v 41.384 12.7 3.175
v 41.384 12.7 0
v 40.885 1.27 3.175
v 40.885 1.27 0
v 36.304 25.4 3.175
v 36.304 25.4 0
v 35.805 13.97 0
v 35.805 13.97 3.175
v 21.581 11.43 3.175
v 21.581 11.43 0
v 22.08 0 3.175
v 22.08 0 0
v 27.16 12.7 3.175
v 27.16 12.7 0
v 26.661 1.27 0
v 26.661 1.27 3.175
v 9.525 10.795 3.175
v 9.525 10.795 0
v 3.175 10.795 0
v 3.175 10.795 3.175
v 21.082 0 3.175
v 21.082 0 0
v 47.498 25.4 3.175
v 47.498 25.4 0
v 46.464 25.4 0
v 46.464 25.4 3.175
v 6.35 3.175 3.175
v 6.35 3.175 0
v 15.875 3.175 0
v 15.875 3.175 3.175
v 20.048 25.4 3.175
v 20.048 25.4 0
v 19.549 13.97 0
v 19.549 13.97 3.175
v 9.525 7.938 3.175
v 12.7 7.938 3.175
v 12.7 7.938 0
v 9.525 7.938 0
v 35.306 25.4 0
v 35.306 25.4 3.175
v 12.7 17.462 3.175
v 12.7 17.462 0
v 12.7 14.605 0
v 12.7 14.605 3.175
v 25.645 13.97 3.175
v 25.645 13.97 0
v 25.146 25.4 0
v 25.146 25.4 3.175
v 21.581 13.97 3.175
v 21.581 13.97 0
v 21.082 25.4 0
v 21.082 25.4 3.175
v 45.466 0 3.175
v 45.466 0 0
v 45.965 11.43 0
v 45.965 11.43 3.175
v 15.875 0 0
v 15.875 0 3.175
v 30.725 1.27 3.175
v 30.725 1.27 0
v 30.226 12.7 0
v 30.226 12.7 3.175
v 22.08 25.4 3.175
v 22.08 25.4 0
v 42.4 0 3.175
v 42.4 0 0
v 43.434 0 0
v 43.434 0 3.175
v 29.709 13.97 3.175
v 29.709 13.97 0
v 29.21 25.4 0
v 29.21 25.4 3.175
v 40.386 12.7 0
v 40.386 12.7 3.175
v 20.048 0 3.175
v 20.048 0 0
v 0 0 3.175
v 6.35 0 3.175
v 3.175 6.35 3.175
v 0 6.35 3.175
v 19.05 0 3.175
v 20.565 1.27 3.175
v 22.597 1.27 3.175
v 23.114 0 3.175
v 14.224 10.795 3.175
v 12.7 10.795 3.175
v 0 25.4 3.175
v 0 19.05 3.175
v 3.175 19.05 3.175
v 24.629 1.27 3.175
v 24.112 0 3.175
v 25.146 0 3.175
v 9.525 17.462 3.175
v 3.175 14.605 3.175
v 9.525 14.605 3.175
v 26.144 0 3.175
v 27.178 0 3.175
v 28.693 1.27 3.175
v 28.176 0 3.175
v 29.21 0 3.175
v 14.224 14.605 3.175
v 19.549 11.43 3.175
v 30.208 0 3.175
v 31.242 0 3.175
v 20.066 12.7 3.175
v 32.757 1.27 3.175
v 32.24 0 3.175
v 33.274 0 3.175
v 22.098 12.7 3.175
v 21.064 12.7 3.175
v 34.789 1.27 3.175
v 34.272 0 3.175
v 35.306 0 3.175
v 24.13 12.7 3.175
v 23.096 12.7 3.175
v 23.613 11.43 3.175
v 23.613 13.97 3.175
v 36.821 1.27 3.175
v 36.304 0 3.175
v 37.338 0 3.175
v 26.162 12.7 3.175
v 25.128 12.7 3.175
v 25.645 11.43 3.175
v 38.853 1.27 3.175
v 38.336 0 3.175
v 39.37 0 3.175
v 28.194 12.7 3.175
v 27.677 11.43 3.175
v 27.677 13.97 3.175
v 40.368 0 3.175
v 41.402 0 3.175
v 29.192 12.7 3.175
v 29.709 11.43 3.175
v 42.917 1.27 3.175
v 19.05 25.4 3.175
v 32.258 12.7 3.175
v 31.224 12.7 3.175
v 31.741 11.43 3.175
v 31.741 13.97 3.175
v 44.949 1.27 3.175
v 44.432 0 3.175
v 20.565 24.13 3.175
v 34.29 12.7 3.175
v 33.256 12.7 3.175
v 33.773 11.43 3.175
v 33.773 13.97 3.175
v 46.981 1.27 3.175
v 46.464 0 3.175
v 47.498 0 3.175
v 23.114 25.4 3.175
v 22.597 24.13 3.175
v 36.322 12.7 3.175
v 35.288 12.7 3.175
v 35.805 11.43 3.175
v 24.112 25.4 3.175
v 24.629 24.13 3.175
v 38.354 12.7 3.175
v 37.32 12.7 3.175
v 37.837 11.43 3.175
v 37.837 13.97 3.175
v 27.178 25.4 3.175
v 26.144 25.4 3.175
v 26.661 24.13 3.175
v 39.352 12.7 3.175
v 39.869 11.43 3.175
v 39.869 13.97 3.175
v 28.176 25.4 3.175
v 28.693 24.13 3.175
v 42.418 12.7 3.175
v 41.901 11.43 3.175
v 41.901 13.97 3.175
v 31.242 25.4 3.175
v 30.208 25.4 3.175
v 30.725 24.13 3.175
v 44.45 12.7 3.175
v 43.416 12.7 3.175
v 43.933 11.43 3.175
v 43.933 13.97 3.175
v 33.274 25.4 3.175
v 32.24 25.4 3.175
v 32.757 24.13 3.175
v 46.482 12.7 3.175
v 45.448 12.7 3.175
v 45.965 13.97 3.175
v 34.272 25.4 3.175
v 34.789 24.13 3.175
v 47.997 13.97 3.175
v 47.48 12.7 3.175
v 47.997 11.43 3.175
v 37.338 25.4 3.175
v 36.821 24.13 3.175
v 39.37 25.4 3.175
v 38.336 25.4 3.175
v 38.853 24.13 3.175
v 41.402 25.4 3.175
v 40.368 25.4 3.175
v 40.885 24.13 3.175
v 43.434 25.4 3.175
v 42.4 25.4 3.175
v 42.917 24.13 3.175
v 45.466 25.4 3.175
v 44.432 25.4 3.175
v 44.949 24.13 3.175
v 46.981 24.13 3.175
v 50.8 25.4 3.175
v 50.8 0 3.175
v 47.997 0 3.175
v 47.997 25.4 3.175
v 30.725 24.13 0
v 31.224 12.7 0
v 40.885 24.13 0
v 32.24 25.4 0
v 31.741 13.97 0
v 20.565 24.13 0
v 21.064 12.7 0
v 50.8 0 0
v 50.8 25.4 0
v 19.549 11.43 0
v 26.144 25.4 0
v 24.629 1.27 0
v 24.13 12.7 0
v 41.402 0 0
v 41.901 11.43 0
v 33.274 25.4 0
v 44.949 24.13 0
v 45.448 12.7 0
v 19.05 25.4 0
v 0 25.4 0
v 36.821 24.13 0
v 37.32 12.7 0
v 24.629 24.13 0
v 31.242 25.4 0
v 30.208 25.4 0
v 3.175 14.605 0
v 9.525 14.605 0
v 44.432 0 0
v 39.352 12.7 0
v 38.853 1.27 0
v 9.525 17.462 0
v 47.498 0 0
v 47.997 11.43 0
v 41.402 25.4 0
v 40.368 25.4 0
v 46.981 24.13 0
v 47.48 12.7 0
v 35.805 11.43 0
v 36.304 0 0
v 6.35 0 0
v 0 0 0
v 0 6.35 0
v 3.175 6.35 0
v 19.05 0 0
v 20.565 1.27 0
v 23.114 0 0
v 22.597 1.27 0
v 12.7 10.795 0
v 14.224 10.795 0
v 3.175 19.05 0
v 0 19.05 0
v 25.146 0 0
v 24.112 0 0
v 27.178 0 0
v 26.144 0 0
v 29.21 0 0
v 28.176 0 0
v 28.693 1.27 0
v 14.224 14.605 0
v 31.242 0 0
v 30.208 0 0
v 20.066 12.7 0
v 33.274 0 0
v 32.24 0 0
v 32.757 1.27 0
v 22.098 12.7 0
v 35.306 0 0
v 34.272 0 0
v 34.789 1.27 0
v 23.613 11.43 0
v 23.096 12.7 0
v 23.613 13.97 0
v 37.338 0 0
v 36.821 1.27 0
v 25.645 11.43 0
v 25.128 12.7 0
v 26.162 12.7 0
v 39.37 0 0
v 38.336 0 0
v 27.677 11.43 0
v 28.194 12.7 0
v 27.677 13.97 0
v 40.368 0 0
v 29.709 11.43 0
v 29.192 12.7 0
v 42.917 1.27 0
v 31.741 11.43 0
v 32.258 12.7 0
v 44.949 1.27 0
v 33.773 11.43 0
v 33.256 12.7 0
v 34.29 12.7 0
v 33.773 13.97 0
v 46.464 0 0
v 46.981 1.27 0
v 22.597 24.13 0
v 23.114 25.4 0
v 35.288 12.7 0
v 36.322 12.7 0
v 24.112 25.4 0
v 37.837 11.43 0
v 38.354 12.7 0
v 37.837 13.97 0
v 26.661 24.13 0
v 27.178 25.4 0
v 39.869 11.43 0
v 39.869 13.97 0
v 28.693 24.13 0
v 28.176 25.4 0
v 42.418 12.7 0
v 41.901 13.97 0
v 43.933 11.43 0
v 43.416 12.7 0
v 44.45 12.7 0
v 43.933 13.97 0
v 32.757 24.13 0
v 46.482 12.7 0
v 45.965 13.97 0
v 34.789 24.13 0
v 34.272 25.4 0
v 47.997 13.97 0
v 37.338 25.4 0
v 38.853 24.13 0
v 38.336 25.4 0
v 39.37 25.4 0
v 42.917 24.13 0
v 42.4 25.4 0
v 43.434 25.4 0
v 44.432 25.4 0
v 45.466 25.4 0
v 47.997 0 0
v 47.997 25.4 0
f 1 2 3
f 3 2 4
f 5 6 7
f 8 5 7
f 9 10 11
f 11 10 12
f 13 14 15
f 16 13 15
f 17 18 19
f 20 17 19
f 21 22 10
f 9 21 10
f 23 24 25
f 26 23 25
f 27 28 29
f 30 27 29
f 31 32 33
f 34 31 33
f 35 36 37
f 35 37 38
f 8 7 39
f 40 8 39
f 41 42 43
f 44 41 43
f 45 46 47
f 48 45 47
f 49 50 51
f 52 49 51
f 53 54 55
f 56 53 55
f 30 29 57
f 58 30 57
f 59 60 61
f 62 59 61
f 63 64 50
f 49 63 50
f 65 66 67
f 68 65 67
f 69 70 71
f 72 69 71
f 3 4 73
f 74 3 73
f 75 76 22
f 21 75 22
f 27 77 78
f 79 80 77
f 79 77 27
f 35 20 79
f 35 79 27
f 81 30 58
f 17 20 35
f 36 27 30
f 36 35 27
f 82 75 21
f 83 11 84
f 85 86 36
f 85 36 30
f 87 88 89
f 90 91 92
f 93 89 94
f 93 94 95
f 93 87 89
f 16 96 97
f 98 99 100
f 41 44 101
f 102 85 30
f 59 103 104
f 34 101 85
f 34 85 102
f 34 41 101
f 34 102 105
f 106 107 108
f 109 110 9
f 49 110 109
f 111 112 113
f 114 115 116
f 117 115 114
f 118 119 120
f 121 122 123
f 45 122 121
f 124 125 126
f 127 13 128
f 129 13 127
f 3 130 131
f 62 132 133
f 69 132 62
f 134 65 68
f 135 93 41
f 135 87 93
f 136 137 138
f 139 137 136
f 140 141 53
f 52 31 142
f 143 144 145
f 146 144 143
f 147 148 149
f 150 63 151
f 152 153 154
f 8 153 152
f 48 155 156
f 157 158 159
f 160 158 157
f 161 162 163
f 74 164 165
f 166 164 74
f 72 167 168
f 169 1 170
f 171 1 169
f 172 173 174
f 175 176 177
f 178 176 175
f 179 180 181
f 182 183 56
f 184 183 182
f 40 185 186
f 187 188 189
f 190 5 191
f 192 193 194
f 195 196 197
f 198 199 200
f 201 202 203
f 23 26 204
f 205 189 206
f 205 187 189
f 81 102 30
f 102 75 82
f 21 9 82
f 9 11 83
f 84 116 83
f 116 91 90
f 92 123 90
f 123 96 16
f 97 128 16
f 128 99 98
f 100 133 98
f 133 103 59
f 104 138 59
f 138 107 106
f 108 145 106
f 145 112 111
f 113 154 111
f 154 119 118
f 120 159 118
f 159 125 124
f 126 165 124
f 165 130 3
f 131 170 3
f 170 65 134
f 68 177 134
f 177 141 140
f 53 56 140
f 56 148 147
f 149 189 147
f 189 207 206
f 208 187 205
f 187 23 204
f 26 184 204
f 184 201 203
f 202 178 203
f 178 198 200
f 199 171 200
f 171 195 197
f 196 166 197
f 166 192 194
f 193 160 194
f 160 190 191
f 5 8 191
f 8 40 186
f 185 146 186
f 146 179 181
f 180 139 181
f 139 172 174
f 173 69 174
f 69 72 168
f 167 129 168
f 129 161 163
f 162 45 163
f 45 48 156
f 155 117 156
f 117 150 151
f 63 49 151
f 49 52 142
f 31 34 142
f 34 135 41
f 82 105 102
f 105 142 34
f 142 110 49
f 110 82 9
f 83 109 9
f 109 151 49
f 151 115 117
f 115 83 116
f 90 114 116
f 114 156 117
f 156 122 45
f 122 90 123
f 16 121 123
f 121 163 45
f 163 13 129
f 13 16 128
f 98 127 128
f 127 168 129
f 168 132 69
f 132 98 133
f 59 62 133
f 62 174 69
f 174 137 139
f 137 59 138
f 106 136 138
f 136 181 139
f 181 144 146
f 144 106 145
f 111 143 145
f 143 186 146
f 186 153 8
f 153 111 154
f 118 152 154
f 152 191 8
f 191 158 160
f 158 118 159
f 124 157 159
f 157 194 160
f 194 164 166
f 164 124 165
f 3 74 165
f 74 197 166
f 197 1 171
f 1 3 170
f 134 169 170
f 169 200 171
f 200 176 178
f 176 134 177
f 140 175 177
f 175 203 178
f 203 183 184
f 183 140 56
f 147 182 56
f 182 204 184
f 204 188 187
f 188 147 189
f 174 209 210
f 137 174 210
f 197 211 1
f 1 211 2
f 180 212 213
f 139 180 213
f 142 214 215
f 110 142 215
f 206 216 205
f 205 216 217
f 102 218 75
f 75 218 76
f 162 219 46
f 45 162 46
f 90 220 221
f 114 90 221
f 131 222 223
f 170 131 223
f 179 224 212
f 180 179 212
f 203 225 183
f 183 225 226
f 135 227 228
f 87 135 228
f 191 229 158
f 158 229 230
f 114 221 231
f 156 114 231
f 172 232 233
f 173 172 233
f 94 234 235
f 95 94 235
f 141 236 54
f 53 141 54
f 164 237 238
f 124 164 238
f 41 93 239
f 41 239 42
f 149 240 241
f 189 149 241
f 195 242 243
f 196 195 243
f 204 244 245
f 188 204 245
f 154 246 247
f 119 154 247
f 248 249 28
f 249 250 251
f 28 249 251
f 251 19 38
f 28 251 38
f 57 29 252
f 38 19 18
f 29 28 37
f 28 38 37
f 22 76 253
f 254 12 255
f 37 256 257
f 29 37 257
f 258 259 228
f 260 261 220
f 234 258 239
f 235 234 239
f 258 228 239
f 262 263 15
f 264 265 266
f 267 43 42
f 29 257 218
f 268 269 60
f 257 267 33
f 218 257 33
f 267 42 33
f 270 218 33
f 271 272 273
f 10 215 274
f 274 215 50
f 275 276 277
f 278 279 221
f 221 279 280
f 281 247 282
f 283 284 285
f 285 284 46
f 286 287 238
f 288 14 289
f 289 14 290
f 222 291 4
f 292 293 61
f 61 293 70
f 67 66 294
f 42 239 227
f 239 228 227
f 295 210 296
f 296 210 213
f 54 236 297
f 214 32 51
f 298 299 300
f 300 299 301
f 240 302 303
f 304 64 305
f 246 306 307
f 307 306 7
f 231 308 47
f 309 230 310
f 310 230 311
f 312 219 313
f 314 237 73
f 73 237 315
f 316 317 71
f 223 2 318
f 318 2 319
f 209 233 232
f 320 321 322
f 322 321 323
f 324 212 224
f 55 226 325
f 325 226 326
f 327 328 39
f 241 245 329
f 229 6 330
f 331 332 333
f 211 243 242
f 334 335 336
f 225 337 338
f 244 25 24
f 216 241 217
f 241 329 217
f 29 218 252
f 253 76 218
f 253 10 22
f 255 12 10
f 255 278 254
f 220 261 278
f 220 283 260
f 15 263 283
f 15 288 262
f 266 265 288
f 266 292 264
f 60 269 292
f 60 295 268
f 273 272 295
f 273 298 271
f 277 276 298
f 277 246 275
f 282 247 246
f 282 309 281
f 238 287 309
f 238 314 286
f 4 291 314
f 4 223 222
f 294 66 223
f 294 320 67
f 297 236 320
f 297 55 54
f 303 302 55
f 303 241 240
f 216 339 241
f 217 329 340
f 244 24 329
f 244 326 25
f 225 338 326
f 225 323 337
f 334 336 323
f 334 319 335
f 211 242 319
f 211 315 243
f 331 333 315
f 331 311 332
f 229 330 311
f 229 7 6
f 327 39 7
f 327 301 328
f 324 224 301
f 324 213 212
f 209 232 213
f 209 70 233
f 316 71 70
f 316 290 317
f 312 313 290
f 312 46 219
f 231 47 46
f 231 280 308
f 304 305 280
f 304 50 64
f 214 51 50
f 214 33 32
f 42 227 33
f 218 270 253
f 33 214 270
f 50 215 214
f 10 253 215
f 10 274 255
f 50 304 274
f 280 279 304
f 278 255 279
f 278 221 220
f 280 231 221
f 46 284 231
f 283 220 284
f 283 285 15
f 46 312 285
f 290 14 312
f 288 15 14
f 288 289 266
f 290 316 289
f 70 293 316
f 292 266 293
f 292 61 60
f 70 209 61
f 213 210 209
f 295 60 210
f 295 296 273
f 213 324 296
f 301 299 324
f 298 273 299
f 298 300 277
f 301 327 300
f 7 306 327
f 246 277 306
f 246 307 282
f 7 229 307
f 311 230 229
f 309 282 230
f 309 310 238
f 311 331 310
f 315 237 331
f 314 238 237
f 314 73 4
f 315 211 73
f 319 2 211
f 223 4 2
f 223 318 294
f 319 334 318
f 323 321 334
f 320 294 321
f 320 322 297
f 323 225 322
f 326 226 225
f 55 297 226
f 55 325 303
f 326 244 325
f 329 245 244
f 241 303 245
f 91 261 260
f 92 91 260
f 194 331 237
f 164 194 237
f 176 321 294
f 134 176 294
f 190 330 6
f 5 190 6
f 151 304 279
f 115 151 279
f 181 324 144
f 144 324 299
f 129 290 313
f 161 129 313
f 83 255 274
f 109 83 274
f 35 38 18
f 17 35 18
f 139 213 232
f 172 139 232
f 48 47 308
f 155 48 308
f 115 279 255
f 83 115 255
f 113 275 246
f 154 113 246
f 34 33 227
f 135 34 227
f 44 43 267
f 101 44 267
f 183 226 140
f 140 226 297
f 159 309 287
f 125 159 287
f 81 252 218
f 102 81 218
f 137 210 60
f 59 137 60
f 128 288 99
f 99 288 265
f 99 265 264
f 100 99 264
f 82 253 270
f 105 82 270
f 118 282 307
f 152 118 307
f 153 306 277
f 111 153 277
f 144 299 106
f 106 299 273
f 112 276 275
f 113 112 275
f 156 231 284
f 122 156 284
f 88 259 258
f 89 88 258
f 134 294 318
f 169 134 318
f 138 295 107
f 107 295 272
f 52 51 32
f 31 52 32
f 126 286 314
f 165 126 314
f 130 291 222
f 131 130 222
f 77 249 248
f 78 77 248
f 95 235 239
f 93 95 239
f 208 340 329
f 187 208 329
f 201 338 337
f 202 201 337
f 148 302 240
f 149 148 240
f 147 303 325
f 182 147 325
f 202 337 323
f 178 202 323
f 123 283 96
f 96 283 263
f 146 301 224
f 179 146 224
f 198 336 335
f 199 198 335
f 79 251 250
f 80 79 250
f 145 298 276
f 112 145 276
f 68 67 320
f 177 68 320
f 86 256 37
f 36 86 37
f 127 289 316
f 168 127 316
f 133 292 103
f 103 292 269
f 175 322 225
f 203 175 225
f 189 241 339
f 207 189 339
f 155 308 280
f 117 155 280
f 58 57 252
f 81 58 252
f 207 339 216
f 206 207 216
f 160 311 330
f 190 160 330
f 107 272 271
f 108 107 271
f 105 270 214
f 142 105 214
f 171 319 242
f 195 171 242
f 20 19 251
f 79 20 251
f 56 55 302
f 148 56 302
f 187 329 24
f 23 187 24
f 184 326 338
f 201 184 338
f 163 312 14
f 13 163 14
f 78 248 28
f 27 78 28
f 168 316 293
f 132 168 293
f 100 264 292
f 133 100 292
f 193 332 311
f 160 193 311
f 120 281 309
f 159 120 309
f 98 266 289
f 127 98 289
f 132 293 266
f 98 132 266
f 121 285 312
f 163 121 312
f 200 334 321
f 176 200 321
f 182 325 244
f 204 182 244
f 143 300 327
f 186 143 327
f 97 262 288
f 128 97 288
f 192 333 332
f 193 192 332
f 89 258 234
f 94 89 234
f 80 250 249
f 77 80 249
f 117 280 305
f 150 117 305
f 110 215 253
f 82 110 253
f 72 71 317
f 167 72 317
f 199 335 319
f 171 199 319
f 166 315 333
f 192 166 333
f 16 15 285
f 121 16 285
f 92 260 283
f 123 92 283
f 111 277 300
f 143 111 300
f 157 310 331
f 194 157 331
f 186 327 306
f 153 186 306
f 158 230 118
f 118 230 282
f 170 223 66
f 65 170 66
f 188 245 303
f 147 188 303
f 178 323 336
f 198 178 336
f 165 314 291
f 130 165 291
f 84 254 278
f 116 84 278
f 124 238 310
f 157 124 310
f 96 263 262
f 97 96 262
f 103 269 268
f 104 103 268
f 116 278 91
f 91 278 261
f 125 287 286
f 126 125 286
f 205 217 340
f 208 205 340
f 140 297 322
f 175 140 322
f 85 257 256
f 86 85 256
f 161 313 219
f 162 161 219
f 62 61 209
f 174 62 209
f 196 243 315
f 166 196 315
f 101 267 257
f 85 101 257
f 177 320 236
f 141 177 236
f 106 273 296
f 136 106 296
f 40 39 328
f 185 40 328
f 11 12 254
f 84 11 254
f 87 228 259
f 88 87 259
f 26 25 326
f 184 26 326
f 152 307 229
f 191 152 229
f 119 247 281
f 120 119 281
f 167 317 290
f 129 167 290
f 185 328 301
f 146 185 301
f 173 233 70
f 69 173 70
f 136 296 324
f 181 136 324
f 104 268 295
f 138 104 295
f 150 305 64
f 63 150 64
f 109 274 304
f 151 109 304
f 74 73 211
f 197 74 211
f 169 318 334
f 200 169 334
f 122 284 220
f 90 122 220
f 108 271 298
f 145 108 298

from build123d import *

# Parameters (mm, degrees)
BOSS_EXTRUDE2_DEPTH = 3.175


with BuildPart() as part:
    # Sketch1 → Boss-Extrude2 (new body)
    with BuildSketch(Plane.XY):
        Polygon((0, 6.35), (0, 0), (6.35, 0), (6.35, 3.175), (15.875, 3.175), (15.875, 0), (19.05, 0), (19.549044577, 11.43), (20.048089155, 0), (21.082, 0), (21.581044577, 11.43), (22.080089155, 0), (23.114, 0), (23.613044577, 11.43), (24.112089155, 0), (25.146, 0), (25.645044577, 11.43), (26.144089155, 0), (27.178, 0), (27.677044577, 11.43), (28.176089155, 0), (29.21, 0), (29.709044577, 11.43), (30.208089155, 0), (31.242, 0), (31.741044577, 11.43), (32.240089155, 0), (33.274, 0), (33.773044577, 11.43), (34.272089155, 0), (35.306, 0), (35.805044577, 11.43), (36.304089155, 0), (37.338, 0), (37.837044577, 11.43), (38.336089155, 0), (39.37, 0), (39.869044577, 11.43), (40.368089155, 0), (41.402, 0), (41.901044577, 11.43), (42.400089155, 0), (43.434, 0), (43.933044577, 11.43), (44.432089155, 0), (45.466, 0), (45.965044577, 11.43), (46.464089155, 0), (47.498, 0), (47.997044577, 11.43), (47.997044577, 0), (50.8, 0), (50.8, 25.4), (47.997044577, 25.4), (47.997044577, 13.97), (47.498, 25.4), (46.464089155, 25.4), (45.965044577, 13.97), (45.466, 25.4), (44.432089155, 25.4), (43.933044577, 13.97), (43.434, 25.4), (42.400089155, 25.4), (41.901044577, 13.97), (41.402, 25.4), (40.368089155, 25.4), (39.869044577, 13.97), (39.37, 25.4), (38.336089155, 25.4), (37.837044577, 13.97), (37.338, 25.4), (36.304089155, 25.4), (35.805044577, 13.97), (35.306, 25.4), (34.272089155, 25.4), (33.773044577, 13.97), (33.274, 25.4), (32.240089155, 25.4), (31.741044577, 13.97), (31.242, 25.4), (30.208089155, 25.4), (29.709044577, 13.97), (29.21, 25.4), (28.176089155, 25.4), (27.677044577, 13.97), (27.178, 25.4), (26.144089155, 25.4), (25.645044577, 13.97), (25.146, 25.4), (24.112089155, 25.4), (23.613044577, 13.97), (23.114, 25.4), (22.080089155, 25.4), (21.581044577, 13.97), (21.082, 25.4), (20.048089155, 25.4), (19.549044577, 13.97), (19.05, 25.4), (0, 25.4), (0, 19.05), (3.175, 19.05), (3.175, 14.605), (9.525, 14.605), (9.525, 17.4625), (12.7, 17.4625), (12.7, 14.605), (14.224, 14.605), (14.224, 10.795), (12.7, 10.795), (12.7, 7.9375), (9.525, 7.9375), (9.525, 10.795), (3.175, 10.795), (3.175, 6.35), align=None)
        Polygon((20.066, 12.7), (20.565044577, 24.13), (21.064089155, 12.7), (20.565044577, 1.27), align=None, mode=Mode.SUBTRACT)
        Polygon((22.098, 12.7), (22.597044577, 24.13), (23.096089155, 12.7), (22.597044577, 1.27), align=None, mode=Mode.SUBTRACT)
        Polygon((24.13, 12.7), (24.629044577, 24.13), (25.128089155, 12.7), (24.629044577, 1.27), align=None, mode=Mode.SUBTRACT)
        Polygon((26.162, 12.7), (26.661044577, 24.13), (27.160089155, 12.7), (26.661044577, 1.27), align=None, mode=Mode.SUBTRACT)
        Polygon((28.194, 12.7), (28.693044577, 24.13), (29.192089155, 12.7), (28.693044577, 1.27), align=None, mode=Mode.SUBTRACT)
        Polygon((30.226, 12.7), (30.725044577, 24.13), (31.224089155, 12.7), (30.725044577, 1.27), align=None, mode=Mode.SUBTRACT)
        Polygon((32.258, 12.7), (32.757044577, 24.13), (33.256089155, 12.7), (32.757044577, 1.27), align=None, mode=Mode.SUBTRACT)
        Polygon((34.29, 12.7), (34.789044577, 24.13), (35.288089155, 12.7), (34.789044577, 1.27), align=None, mode=Mode.SUBTRACT)
        Polygon((36.322, 12.7), (36.821044577, 24.13), (37.320089155, 12.7), (36.821044577, 1.27), align=None, mode=Mode.SUBTRACT)
        Polygon((38.354, 12.7), (38.853044577, 24.13), (39.352089155, 12.7), (38.853044577, 1.27), align=None, mode=Mode.SUBTRACT)
        Polygon((40.386, 12.7), (40.885044577, 24.13), (41.384089155, 12.7), (40.885044577, 1.27), align=None, mode=Mode.SUBTRACT)
        Polygon((42.418, 12.7), (42.917044577, 24.13), (43.416089155, 12.7), (42.917044577, 1.27), align=None, mode=Mode.SUBTRACT)
        Polygon((44.45, 12.7), (44.949044577, 24.13), (45.448089155, 12.7), (44.949044577, 1.27), align=None, mode=Mode.SUBTRACT)
        Polygon((46.482, 12.7), (46.981044577, 24.13), (47.480089155, 12.7), (46.981044577, 1.27), align=None, mode=Mode.SUBTRACT)
    extrude(amount=BOSS_EXTRUDE2_DEPTH)


solid = part.part
